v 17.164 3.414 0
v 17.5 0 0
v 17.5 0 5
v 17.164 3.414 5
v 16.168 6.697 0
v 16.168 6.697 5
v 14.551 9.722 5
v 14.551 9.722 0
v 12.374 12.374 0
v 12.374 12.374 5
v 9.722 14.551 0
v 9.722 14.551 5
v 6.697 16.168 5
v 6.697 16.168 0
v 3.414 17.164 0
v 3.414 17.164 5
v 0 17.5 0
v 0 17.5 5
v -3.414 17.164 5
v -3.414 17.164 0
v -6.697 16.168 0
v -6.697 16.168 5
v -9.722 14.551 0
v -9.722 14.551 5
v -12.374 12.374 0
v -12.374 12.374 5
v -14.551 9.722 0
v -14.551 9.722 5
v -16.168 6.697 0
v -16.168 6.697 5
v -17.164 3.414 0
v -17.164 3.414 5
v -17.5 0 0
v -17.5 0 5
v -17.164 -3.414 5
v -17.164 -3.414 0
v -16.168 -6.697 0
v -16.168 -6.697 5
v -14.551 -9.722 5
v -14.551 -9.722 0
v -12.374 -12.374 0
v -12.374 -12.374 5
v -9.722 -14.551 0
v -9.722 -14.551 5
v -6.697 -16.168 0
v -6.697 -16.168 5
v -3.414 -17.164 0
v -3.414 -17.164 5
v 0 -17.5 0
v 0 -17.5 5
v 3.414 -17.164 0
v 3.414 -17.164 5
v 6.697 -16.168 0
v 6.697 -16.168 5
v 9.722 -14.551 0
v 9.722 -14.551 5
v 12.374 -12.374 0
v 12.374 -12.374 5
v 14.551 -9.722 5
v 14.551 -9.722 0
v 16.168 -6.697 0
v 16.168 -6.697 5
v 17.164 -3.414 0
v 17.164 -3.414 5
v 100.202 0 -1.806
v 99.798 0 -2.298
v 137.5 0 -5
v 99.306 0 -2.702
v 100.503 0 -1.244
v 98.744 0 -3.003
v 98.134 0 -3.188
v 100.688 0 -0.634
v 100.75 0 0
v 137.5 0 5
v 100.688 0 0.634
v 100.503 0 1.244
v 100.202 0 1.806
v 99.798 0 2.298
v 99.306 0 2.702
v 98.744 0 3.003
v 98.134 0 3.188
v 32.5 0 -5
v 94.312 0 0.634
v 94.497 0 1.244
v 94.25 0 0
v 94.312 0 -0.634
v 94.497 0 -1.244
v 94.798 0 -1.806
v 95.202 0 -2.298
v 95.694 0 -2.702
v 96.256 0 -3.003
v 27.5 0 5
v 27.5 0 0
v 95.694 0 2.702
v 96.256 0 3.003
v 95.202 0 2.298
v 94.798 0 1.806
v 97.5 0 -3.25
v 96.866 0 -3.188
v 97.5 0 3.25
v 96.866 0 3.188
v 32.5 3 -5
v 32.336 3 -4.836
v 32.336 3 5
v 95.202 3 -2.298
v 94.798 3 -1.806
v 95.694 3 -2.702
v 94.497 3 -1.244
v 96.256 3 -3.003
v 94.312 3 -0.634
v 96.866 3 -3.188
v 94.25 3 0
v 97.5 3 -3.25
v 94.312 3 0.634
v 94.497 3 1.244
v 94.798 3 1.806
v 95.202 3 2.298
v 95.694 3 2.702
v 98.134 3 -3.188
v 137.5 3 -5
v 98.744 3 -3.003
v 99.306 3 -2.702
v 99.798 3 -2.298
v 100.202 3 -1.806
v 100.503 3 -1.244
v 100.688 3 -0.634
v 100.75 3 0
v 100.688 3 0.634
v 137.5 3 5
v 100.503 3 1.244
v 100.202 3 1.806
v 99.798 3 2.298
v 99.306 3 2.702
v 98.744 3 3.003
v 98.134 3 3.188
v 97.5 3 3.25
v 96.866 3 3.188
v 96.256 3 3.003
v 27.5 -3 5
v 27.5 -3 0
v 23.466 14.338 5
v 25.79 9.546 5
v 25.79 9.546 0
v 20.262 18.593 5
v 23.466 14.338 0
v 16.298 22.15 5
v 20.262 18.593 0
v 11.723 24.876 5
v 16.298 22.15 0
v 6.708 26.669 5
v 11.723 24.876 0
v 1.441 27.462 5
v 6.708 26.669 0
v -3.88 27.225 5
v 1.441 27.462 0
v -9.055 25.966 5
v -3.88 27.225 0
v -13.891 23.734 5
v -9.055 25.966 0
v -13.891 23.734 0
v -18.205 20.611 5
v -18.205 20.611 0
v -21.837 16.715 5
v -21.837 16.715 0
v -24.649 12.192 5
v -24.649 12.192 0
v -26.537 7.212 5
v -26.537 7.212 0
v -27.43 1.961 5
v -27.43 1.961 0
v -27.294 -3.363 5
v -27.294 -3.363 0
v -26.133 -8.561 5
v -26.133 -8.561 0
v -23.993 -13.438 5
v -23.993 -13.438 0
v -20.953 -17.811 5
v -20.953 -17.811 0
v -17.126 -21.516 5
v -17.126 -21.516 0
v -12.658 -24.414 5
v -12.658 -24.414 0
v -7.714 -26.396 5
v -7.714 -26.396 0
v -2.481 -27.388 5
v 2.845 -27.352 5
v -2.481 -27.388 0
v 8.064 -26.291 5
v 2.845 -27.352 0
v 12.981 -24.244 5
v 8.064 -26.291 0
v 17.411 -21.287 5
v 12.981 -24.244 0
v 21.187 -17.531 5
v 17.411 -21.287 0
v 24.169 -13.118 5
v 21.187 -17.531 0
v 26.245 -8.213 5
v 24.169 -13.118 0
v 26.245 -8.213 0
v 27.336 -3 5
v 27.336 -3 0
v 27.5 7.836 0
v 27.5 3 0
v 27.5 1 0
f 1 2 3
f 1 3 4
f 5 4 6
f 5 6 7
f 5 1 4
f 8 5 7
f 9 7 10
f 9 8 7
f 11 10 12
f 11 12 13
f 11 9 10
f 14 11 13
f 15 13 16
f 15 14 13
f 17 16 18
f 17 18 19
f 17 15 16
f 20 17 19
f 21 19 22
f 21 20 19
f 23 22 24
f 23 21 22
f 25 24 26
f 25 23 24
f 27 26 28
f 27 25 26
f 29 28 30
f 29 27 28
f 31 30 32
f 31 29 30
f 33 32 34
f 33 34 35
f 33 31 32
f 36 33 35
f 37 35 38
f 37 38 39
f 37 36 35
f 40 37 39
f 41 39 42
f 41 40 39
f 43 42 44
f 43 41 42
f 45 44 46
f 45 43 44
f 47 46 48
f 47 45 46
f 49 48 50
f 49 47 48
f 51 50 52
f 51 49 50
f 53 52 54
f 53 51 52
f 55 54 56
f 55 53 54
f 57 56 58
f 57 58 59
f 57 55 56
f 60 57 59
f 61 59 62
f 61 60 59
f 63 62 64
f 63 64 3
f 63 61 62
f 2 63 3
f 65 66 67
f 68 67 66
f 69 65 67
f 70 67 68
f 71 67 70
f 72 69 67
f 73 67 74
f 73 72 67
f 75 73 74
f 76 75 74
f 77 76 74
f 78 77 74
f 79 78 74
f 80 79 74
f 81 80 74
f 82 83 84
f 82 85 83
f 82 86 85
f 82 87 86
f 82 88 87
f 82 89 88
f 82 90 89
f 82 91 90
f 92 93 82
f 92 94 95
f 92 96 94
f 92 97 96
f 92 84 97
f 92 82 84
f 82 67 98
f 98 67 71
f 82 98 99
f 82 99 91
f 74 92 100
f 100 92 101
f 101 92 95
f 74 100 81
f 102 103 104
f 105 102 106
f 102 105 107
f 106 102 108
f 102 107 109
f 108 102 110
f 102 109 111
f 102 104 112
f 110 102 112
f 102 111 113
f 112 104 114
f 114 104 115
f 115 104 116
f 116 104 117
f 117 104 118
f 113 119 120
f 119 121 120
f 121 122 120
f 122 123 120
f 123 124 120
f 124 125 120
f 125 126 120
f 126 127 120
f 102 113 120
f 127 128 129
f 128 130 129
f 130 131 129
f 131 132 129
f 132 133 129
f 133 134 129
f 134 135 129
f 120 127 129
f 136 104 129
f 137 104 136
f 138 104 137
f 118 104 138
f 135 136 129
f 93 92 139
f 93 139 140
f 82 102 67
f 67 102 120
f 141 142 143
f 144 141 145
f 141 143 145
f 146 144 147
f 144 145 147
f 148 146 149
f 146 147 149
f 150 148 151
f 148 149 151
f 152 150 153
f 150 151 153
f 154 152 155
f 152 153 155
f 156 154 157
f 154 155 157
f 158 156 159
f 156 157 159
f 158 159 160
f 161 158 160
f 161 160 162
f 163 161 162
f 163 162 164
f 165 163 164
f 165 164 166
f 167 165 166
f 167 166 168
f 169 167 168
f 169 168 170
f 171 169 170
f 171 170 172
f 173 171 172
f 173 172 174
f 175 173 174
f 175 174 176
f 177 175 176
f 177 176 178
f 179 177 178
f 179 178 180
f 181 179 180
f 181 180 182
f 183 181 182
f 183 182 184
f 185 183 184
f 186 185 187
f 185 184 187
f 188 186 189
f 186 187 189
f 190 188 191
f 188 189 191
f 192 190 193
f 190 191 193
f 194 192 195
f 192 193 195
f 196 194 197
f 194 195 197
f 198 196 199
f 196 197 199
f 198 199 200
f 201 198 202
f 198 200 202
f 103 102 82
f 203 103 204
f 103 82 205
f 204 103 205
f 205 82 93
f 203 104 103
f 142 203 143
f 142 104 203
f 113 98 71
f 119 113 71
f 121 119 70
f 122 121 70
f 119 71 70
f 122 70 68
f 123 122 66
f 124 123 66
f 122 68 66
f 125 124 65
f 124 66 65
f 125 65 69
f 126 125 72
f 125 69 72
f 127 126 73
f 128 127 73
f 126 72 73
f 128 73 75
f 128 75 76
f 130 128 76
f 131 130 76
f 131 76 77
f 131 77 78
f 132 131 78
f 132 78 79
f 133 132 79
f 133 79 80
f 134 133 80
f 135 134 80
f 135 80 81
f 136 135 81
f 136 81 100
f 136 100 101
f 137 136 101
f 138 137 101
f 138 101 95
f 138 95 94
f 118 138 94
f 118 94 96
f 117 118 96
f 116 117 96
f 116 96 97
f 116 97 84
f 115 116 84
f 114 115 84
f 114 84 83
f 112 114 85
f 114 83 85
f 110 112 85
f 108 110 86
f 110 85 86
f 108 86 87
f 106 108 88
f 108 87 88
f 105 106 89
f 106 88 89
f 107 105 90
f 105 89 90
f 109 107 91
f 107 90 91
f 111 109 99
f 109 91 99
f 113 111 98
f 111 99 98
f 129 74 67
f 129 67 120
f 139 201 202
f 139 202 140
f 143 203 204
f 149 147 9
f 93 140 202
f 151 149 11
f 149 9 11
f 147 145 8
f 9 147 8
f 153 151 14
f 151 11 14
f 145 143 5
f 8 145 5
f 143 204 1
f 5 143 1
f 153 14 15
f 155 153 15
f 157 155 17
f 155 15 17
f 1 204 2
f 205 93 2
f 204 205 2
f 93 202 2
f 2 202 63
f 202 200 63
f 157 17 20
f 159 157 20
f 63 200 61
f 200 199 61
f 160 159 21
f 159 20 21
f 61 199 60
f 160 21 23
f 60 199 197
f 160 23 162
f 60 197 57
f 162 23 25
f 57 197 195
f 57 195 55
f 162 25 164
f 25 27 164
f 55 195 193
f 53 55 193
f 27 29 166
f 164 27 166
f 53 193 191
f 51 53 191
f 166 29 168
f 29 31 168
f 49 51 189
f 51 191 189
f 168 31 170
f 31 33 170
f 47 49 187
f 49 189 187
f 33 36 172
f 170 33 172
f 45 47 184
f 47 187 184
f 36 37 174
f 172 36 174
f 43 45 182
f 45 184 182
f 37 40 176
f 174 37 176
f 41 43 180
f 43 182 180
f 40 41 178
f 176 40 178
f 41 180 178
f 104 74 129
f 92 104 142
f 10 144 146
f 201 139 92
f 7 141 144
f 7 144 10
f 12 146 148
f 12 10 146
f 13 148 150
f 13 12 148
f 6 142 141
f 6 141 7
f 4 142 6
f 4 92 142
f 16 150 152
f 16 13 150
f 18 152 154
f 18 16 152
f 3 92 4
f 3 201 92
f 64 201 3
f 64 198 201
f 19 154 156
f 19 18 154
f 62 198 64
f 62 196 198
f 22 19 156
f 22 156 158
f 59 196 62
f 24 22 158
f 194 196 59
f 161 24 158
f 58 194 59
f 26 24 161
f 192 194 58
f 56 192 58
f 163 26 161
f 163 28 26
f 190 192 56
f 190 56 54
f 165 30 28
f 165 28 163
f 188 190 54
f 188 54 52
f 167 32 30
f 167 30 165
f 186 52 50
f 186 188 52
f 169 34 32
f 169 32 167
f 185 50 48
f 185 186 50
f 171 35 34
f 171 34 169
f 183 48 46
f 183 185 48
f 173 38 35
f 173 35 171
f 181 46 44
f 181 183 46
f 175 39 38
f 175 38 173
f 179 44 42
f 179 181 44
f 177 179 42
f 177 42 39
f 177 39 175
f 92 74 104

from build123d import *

# Parameters (mm, degrees)
SKETCH1_R           = 27.5
SKETCH1_R_2         = 17.5
BOSS_EXTRUDE1_DEPTH = 5
SKETCH2_W           = 120
SKETCH2_H           = 6
BOSS_EXTRUDE2_DEPTH = 10
SKETCH3_W           = 5
SKETCH3_H           = 3
CUT_EXTRUDE2_DEPTH  = 140
SKETCH4_W           = 5
SKETCH4_H           = 3
CUT_EXTRUDE3_DEPTH  = 10
CHAMFER2_SIZE       = 5
SKETCH5_W           = 5
SKETCH5_H           = 3
CUT_EXTRUDE4_DEPTH  = 110
CHAMFER3_SIZE       = 5
SKETCH6_R           = 3.25
CUT_EXTRUDE5_DEPTH  = 110


# Some blends are built 0.0001 mm under size
with BuildPart() as part:
    # Sketch1 → Boss-Extrude1 (new body)
    with BuildSketch(Plane.XY):
        Circle(SKETCH1_R)
        Circle(SKETCH1_R_2, mode=Mode.SUBTRACT)
    extrude(amount=BOSS_EXTRUDE1_DEPTH)

    # Sketch2 → Boss-Extrude2 (add)
    with BuildSketch(Plane.XY.offset(5)):
        with Locations((77.5, 0)):
            Rectangle(SKETCH2_W, SKETCH2_H)
    extrude(amount=-BOSS_EXTRUDE2_DEPTH)

    # Sketch3 → Cut-Extrude2 (cut)
    with BuildSketch(Plane.ZY.offset(-17.5)):
        with Locations((-2.5, -1.5)):
            Rectangle(SKETCH3_W, SKETCH3_H)
    extrude(amount=-CUT_EXTRUDE2_DEPTH, mode=Mode.SUBTRACT)

    # Sketch4 → Cut-Extrude3 (cut)
    with BuildSketch(Plane.ZY.offset(-17.5)):
        with Locations((-2.5, 1.5)):
            Rectangle(SKETCH4_W, SKETCH4_H)
    extrude(amount=-CUT_EXTRUDE3_DEPTH, mode=Mode.SUBTRACT)

    # Chamfer2
    chamfer2_edges = [part.edges().sort_by_distance(p)[0] for p in [
        (27.5, 1.5, -5),
    ]]
    chamfer(chamfer2_edges, length=CHAMFER2_SIZE - 0.0001)  # a hair under: the kernel refuses the full size

    # Sketch5 → Cut-Extrude4 (cut)
    with BuildSketch(Plane(origin=(137.5, 0, 0), x_dir=(0, 0, -1), z_dir=(1, 0, 0))):
        with Locations((-2.5, -1.5)):
            Rectangle(SKETCH5_W, SKETCH5_H)
    extrude(amount=-CUT_EXTRUDE4_DEPTH, mode=Mode.SUBTRACT)

    # Chamfer3
    # the kernel refuses this chamfer: 5.650095031, 5 mm, written as the material it adds along each edge
    with BuildSketch(Plane(origin=(27.335873866, 3, 5), x_dir=(1, 0, 0), z_dir=(0, 0, -1))) as chamfer3_piece_1_section:
        with BuildLine():
            Line((CHAMFER3_SIZE, 0), (-1.545806391, -6.545806391))
            ThreePointArc((-1.545806391, -6.545806391), (-0.594506403, -3.414769383), (0, 0))
            Line((0, 0), (CHAMFER3_SIZE, 0))
        make_face()
    chamfer3_piece_1 = extrude(amount=5, mode=Mode.PRIVATE)
    chamfer3_piece_1 = split(chamfer3_piece_1, bisect_by=Plane(origin=(27.5, 3, 5), z_dir=(1, 0, 0)), keep=Keep.TOP, mode=Mode.PRIVATE)
    add(chamfer3_piece_1)
    with BuildSketch(Plane(origin=(27.335873866, 3, 5), x_dir=(1, 0, 0), z_dir=(0, 0, -1))) as chamfer3_piece_2_section:
        with BuildLine():
            Line((CHAMFER3_SIZE, 0), (-1.545806391, -6.545806391))
            ThreePointArc((-1.545806391, -6.545806391), (-0.594506403, -3.414769383), (0, 0))
            Line((0, 0), (CHAMFER3_SIZE, 0))
        make_face()
    chamfer3_piece_2 = extrude(amount=5, mode=Mode.PRIVATE)
    chamfer3_piece_2 = split(chamfer3_piece_2, bisect_by=Plane(origin=(24.917886933, 3, 2.582013067), z_dir=(0.7071067811865478, 0, 0.7071067811865472)), keep=Keep.TOP, mode=Mode.PRIVATE)
    chamfer3_piece_2 = split(chamfer3_piece_2, bisect_by=Plane(origin=(27.5, 3, 5), z_dir=(-1, 0, 0)), keep=Keep.TOP, mode=Mode.PRIVATE)
    add(chamfer3_piece_2)
    with BuildSketch(Plane(origin=(27.335873866, 3, 5), x_dir=(1, 0, 0), z_dir=(0, 0, -1))) as chamfer3_piece_3_section:
        with BuildLine():
            Line((CHAMFER3_SIZE, 0), (-1.545806391, -6.545806391))
            ThreePointArc((-1.545806391, -6.545806391), (-0.594506403, -3.414769383), (0, 0))
            Line((0, 0), (CHAMFER3_SIZE, 0))
        make_face()
    chamfer3_piece_3 = extrude(amount=22.297831984, mode=Mode.PRIVATE)
    chamfer3_piece_3 = split(chamfer3_piece_3, bisect_by=Plane(origin=(24.917886933, 3, 2.582013067), z_dir=(0.7071067811865478, 0, 0.7071067811865472)), keep=Keep.TOP, mode=Mode.PRIVATE)
    chamfer3_piece_3 = split(chamfer3_piece_3, bisect_by=Plane(origin=(27.335873866, 3, 0), z_dir=(0, 0, -1)), keep=Keep.TOP, mode=Mode.PRIVATE)
    add(chamfer3_piece_3)
    with BuildSketch(Plane(origin=(27.335873866, 3, 5), x_dir=(1, 0, 0), z_dir=(0, 0, -1))) as chamfer3_piece_4_section:
        with BuildLine():
            Line((CHAMFER3_SIZE, 0), (-1.545806391, -6.545806391))
            ThreePointArc((-1.545806391, -6.545806391), (-0.594506403, -3.414769383), (0, 0))
            Line((0, 0), (CHAMFER3_SIZE, 0))
        make_face()
    chamfer3_piece_4 = extrude(amount=5, mode=Mode.PRIVATE)
    chamfer3_piece_4 = split(chamfer3_piece_4, bisect_by=Plane(origin=(24.917886933, 3, 2.582013067), z_dir=(-0.7071067811865478, 0, -0.7071067811865472)), keep=Keep.TOP, mode=Mode.PRIVATE)
    add(chamfer3_piece_4)

    # Sketch6 → Cut-Extrude5 (cut)
    with BuildSketch(Plane.XZ):
        with Locations(Location((97.5, 0, 0), (0, 0, 270))):
            Circle(SKETCH6_R)
    extrude(amount=-CUT_EXTRUDE5_DEPTH, mode=Mode.SUBTRACT)


solid = part.part
